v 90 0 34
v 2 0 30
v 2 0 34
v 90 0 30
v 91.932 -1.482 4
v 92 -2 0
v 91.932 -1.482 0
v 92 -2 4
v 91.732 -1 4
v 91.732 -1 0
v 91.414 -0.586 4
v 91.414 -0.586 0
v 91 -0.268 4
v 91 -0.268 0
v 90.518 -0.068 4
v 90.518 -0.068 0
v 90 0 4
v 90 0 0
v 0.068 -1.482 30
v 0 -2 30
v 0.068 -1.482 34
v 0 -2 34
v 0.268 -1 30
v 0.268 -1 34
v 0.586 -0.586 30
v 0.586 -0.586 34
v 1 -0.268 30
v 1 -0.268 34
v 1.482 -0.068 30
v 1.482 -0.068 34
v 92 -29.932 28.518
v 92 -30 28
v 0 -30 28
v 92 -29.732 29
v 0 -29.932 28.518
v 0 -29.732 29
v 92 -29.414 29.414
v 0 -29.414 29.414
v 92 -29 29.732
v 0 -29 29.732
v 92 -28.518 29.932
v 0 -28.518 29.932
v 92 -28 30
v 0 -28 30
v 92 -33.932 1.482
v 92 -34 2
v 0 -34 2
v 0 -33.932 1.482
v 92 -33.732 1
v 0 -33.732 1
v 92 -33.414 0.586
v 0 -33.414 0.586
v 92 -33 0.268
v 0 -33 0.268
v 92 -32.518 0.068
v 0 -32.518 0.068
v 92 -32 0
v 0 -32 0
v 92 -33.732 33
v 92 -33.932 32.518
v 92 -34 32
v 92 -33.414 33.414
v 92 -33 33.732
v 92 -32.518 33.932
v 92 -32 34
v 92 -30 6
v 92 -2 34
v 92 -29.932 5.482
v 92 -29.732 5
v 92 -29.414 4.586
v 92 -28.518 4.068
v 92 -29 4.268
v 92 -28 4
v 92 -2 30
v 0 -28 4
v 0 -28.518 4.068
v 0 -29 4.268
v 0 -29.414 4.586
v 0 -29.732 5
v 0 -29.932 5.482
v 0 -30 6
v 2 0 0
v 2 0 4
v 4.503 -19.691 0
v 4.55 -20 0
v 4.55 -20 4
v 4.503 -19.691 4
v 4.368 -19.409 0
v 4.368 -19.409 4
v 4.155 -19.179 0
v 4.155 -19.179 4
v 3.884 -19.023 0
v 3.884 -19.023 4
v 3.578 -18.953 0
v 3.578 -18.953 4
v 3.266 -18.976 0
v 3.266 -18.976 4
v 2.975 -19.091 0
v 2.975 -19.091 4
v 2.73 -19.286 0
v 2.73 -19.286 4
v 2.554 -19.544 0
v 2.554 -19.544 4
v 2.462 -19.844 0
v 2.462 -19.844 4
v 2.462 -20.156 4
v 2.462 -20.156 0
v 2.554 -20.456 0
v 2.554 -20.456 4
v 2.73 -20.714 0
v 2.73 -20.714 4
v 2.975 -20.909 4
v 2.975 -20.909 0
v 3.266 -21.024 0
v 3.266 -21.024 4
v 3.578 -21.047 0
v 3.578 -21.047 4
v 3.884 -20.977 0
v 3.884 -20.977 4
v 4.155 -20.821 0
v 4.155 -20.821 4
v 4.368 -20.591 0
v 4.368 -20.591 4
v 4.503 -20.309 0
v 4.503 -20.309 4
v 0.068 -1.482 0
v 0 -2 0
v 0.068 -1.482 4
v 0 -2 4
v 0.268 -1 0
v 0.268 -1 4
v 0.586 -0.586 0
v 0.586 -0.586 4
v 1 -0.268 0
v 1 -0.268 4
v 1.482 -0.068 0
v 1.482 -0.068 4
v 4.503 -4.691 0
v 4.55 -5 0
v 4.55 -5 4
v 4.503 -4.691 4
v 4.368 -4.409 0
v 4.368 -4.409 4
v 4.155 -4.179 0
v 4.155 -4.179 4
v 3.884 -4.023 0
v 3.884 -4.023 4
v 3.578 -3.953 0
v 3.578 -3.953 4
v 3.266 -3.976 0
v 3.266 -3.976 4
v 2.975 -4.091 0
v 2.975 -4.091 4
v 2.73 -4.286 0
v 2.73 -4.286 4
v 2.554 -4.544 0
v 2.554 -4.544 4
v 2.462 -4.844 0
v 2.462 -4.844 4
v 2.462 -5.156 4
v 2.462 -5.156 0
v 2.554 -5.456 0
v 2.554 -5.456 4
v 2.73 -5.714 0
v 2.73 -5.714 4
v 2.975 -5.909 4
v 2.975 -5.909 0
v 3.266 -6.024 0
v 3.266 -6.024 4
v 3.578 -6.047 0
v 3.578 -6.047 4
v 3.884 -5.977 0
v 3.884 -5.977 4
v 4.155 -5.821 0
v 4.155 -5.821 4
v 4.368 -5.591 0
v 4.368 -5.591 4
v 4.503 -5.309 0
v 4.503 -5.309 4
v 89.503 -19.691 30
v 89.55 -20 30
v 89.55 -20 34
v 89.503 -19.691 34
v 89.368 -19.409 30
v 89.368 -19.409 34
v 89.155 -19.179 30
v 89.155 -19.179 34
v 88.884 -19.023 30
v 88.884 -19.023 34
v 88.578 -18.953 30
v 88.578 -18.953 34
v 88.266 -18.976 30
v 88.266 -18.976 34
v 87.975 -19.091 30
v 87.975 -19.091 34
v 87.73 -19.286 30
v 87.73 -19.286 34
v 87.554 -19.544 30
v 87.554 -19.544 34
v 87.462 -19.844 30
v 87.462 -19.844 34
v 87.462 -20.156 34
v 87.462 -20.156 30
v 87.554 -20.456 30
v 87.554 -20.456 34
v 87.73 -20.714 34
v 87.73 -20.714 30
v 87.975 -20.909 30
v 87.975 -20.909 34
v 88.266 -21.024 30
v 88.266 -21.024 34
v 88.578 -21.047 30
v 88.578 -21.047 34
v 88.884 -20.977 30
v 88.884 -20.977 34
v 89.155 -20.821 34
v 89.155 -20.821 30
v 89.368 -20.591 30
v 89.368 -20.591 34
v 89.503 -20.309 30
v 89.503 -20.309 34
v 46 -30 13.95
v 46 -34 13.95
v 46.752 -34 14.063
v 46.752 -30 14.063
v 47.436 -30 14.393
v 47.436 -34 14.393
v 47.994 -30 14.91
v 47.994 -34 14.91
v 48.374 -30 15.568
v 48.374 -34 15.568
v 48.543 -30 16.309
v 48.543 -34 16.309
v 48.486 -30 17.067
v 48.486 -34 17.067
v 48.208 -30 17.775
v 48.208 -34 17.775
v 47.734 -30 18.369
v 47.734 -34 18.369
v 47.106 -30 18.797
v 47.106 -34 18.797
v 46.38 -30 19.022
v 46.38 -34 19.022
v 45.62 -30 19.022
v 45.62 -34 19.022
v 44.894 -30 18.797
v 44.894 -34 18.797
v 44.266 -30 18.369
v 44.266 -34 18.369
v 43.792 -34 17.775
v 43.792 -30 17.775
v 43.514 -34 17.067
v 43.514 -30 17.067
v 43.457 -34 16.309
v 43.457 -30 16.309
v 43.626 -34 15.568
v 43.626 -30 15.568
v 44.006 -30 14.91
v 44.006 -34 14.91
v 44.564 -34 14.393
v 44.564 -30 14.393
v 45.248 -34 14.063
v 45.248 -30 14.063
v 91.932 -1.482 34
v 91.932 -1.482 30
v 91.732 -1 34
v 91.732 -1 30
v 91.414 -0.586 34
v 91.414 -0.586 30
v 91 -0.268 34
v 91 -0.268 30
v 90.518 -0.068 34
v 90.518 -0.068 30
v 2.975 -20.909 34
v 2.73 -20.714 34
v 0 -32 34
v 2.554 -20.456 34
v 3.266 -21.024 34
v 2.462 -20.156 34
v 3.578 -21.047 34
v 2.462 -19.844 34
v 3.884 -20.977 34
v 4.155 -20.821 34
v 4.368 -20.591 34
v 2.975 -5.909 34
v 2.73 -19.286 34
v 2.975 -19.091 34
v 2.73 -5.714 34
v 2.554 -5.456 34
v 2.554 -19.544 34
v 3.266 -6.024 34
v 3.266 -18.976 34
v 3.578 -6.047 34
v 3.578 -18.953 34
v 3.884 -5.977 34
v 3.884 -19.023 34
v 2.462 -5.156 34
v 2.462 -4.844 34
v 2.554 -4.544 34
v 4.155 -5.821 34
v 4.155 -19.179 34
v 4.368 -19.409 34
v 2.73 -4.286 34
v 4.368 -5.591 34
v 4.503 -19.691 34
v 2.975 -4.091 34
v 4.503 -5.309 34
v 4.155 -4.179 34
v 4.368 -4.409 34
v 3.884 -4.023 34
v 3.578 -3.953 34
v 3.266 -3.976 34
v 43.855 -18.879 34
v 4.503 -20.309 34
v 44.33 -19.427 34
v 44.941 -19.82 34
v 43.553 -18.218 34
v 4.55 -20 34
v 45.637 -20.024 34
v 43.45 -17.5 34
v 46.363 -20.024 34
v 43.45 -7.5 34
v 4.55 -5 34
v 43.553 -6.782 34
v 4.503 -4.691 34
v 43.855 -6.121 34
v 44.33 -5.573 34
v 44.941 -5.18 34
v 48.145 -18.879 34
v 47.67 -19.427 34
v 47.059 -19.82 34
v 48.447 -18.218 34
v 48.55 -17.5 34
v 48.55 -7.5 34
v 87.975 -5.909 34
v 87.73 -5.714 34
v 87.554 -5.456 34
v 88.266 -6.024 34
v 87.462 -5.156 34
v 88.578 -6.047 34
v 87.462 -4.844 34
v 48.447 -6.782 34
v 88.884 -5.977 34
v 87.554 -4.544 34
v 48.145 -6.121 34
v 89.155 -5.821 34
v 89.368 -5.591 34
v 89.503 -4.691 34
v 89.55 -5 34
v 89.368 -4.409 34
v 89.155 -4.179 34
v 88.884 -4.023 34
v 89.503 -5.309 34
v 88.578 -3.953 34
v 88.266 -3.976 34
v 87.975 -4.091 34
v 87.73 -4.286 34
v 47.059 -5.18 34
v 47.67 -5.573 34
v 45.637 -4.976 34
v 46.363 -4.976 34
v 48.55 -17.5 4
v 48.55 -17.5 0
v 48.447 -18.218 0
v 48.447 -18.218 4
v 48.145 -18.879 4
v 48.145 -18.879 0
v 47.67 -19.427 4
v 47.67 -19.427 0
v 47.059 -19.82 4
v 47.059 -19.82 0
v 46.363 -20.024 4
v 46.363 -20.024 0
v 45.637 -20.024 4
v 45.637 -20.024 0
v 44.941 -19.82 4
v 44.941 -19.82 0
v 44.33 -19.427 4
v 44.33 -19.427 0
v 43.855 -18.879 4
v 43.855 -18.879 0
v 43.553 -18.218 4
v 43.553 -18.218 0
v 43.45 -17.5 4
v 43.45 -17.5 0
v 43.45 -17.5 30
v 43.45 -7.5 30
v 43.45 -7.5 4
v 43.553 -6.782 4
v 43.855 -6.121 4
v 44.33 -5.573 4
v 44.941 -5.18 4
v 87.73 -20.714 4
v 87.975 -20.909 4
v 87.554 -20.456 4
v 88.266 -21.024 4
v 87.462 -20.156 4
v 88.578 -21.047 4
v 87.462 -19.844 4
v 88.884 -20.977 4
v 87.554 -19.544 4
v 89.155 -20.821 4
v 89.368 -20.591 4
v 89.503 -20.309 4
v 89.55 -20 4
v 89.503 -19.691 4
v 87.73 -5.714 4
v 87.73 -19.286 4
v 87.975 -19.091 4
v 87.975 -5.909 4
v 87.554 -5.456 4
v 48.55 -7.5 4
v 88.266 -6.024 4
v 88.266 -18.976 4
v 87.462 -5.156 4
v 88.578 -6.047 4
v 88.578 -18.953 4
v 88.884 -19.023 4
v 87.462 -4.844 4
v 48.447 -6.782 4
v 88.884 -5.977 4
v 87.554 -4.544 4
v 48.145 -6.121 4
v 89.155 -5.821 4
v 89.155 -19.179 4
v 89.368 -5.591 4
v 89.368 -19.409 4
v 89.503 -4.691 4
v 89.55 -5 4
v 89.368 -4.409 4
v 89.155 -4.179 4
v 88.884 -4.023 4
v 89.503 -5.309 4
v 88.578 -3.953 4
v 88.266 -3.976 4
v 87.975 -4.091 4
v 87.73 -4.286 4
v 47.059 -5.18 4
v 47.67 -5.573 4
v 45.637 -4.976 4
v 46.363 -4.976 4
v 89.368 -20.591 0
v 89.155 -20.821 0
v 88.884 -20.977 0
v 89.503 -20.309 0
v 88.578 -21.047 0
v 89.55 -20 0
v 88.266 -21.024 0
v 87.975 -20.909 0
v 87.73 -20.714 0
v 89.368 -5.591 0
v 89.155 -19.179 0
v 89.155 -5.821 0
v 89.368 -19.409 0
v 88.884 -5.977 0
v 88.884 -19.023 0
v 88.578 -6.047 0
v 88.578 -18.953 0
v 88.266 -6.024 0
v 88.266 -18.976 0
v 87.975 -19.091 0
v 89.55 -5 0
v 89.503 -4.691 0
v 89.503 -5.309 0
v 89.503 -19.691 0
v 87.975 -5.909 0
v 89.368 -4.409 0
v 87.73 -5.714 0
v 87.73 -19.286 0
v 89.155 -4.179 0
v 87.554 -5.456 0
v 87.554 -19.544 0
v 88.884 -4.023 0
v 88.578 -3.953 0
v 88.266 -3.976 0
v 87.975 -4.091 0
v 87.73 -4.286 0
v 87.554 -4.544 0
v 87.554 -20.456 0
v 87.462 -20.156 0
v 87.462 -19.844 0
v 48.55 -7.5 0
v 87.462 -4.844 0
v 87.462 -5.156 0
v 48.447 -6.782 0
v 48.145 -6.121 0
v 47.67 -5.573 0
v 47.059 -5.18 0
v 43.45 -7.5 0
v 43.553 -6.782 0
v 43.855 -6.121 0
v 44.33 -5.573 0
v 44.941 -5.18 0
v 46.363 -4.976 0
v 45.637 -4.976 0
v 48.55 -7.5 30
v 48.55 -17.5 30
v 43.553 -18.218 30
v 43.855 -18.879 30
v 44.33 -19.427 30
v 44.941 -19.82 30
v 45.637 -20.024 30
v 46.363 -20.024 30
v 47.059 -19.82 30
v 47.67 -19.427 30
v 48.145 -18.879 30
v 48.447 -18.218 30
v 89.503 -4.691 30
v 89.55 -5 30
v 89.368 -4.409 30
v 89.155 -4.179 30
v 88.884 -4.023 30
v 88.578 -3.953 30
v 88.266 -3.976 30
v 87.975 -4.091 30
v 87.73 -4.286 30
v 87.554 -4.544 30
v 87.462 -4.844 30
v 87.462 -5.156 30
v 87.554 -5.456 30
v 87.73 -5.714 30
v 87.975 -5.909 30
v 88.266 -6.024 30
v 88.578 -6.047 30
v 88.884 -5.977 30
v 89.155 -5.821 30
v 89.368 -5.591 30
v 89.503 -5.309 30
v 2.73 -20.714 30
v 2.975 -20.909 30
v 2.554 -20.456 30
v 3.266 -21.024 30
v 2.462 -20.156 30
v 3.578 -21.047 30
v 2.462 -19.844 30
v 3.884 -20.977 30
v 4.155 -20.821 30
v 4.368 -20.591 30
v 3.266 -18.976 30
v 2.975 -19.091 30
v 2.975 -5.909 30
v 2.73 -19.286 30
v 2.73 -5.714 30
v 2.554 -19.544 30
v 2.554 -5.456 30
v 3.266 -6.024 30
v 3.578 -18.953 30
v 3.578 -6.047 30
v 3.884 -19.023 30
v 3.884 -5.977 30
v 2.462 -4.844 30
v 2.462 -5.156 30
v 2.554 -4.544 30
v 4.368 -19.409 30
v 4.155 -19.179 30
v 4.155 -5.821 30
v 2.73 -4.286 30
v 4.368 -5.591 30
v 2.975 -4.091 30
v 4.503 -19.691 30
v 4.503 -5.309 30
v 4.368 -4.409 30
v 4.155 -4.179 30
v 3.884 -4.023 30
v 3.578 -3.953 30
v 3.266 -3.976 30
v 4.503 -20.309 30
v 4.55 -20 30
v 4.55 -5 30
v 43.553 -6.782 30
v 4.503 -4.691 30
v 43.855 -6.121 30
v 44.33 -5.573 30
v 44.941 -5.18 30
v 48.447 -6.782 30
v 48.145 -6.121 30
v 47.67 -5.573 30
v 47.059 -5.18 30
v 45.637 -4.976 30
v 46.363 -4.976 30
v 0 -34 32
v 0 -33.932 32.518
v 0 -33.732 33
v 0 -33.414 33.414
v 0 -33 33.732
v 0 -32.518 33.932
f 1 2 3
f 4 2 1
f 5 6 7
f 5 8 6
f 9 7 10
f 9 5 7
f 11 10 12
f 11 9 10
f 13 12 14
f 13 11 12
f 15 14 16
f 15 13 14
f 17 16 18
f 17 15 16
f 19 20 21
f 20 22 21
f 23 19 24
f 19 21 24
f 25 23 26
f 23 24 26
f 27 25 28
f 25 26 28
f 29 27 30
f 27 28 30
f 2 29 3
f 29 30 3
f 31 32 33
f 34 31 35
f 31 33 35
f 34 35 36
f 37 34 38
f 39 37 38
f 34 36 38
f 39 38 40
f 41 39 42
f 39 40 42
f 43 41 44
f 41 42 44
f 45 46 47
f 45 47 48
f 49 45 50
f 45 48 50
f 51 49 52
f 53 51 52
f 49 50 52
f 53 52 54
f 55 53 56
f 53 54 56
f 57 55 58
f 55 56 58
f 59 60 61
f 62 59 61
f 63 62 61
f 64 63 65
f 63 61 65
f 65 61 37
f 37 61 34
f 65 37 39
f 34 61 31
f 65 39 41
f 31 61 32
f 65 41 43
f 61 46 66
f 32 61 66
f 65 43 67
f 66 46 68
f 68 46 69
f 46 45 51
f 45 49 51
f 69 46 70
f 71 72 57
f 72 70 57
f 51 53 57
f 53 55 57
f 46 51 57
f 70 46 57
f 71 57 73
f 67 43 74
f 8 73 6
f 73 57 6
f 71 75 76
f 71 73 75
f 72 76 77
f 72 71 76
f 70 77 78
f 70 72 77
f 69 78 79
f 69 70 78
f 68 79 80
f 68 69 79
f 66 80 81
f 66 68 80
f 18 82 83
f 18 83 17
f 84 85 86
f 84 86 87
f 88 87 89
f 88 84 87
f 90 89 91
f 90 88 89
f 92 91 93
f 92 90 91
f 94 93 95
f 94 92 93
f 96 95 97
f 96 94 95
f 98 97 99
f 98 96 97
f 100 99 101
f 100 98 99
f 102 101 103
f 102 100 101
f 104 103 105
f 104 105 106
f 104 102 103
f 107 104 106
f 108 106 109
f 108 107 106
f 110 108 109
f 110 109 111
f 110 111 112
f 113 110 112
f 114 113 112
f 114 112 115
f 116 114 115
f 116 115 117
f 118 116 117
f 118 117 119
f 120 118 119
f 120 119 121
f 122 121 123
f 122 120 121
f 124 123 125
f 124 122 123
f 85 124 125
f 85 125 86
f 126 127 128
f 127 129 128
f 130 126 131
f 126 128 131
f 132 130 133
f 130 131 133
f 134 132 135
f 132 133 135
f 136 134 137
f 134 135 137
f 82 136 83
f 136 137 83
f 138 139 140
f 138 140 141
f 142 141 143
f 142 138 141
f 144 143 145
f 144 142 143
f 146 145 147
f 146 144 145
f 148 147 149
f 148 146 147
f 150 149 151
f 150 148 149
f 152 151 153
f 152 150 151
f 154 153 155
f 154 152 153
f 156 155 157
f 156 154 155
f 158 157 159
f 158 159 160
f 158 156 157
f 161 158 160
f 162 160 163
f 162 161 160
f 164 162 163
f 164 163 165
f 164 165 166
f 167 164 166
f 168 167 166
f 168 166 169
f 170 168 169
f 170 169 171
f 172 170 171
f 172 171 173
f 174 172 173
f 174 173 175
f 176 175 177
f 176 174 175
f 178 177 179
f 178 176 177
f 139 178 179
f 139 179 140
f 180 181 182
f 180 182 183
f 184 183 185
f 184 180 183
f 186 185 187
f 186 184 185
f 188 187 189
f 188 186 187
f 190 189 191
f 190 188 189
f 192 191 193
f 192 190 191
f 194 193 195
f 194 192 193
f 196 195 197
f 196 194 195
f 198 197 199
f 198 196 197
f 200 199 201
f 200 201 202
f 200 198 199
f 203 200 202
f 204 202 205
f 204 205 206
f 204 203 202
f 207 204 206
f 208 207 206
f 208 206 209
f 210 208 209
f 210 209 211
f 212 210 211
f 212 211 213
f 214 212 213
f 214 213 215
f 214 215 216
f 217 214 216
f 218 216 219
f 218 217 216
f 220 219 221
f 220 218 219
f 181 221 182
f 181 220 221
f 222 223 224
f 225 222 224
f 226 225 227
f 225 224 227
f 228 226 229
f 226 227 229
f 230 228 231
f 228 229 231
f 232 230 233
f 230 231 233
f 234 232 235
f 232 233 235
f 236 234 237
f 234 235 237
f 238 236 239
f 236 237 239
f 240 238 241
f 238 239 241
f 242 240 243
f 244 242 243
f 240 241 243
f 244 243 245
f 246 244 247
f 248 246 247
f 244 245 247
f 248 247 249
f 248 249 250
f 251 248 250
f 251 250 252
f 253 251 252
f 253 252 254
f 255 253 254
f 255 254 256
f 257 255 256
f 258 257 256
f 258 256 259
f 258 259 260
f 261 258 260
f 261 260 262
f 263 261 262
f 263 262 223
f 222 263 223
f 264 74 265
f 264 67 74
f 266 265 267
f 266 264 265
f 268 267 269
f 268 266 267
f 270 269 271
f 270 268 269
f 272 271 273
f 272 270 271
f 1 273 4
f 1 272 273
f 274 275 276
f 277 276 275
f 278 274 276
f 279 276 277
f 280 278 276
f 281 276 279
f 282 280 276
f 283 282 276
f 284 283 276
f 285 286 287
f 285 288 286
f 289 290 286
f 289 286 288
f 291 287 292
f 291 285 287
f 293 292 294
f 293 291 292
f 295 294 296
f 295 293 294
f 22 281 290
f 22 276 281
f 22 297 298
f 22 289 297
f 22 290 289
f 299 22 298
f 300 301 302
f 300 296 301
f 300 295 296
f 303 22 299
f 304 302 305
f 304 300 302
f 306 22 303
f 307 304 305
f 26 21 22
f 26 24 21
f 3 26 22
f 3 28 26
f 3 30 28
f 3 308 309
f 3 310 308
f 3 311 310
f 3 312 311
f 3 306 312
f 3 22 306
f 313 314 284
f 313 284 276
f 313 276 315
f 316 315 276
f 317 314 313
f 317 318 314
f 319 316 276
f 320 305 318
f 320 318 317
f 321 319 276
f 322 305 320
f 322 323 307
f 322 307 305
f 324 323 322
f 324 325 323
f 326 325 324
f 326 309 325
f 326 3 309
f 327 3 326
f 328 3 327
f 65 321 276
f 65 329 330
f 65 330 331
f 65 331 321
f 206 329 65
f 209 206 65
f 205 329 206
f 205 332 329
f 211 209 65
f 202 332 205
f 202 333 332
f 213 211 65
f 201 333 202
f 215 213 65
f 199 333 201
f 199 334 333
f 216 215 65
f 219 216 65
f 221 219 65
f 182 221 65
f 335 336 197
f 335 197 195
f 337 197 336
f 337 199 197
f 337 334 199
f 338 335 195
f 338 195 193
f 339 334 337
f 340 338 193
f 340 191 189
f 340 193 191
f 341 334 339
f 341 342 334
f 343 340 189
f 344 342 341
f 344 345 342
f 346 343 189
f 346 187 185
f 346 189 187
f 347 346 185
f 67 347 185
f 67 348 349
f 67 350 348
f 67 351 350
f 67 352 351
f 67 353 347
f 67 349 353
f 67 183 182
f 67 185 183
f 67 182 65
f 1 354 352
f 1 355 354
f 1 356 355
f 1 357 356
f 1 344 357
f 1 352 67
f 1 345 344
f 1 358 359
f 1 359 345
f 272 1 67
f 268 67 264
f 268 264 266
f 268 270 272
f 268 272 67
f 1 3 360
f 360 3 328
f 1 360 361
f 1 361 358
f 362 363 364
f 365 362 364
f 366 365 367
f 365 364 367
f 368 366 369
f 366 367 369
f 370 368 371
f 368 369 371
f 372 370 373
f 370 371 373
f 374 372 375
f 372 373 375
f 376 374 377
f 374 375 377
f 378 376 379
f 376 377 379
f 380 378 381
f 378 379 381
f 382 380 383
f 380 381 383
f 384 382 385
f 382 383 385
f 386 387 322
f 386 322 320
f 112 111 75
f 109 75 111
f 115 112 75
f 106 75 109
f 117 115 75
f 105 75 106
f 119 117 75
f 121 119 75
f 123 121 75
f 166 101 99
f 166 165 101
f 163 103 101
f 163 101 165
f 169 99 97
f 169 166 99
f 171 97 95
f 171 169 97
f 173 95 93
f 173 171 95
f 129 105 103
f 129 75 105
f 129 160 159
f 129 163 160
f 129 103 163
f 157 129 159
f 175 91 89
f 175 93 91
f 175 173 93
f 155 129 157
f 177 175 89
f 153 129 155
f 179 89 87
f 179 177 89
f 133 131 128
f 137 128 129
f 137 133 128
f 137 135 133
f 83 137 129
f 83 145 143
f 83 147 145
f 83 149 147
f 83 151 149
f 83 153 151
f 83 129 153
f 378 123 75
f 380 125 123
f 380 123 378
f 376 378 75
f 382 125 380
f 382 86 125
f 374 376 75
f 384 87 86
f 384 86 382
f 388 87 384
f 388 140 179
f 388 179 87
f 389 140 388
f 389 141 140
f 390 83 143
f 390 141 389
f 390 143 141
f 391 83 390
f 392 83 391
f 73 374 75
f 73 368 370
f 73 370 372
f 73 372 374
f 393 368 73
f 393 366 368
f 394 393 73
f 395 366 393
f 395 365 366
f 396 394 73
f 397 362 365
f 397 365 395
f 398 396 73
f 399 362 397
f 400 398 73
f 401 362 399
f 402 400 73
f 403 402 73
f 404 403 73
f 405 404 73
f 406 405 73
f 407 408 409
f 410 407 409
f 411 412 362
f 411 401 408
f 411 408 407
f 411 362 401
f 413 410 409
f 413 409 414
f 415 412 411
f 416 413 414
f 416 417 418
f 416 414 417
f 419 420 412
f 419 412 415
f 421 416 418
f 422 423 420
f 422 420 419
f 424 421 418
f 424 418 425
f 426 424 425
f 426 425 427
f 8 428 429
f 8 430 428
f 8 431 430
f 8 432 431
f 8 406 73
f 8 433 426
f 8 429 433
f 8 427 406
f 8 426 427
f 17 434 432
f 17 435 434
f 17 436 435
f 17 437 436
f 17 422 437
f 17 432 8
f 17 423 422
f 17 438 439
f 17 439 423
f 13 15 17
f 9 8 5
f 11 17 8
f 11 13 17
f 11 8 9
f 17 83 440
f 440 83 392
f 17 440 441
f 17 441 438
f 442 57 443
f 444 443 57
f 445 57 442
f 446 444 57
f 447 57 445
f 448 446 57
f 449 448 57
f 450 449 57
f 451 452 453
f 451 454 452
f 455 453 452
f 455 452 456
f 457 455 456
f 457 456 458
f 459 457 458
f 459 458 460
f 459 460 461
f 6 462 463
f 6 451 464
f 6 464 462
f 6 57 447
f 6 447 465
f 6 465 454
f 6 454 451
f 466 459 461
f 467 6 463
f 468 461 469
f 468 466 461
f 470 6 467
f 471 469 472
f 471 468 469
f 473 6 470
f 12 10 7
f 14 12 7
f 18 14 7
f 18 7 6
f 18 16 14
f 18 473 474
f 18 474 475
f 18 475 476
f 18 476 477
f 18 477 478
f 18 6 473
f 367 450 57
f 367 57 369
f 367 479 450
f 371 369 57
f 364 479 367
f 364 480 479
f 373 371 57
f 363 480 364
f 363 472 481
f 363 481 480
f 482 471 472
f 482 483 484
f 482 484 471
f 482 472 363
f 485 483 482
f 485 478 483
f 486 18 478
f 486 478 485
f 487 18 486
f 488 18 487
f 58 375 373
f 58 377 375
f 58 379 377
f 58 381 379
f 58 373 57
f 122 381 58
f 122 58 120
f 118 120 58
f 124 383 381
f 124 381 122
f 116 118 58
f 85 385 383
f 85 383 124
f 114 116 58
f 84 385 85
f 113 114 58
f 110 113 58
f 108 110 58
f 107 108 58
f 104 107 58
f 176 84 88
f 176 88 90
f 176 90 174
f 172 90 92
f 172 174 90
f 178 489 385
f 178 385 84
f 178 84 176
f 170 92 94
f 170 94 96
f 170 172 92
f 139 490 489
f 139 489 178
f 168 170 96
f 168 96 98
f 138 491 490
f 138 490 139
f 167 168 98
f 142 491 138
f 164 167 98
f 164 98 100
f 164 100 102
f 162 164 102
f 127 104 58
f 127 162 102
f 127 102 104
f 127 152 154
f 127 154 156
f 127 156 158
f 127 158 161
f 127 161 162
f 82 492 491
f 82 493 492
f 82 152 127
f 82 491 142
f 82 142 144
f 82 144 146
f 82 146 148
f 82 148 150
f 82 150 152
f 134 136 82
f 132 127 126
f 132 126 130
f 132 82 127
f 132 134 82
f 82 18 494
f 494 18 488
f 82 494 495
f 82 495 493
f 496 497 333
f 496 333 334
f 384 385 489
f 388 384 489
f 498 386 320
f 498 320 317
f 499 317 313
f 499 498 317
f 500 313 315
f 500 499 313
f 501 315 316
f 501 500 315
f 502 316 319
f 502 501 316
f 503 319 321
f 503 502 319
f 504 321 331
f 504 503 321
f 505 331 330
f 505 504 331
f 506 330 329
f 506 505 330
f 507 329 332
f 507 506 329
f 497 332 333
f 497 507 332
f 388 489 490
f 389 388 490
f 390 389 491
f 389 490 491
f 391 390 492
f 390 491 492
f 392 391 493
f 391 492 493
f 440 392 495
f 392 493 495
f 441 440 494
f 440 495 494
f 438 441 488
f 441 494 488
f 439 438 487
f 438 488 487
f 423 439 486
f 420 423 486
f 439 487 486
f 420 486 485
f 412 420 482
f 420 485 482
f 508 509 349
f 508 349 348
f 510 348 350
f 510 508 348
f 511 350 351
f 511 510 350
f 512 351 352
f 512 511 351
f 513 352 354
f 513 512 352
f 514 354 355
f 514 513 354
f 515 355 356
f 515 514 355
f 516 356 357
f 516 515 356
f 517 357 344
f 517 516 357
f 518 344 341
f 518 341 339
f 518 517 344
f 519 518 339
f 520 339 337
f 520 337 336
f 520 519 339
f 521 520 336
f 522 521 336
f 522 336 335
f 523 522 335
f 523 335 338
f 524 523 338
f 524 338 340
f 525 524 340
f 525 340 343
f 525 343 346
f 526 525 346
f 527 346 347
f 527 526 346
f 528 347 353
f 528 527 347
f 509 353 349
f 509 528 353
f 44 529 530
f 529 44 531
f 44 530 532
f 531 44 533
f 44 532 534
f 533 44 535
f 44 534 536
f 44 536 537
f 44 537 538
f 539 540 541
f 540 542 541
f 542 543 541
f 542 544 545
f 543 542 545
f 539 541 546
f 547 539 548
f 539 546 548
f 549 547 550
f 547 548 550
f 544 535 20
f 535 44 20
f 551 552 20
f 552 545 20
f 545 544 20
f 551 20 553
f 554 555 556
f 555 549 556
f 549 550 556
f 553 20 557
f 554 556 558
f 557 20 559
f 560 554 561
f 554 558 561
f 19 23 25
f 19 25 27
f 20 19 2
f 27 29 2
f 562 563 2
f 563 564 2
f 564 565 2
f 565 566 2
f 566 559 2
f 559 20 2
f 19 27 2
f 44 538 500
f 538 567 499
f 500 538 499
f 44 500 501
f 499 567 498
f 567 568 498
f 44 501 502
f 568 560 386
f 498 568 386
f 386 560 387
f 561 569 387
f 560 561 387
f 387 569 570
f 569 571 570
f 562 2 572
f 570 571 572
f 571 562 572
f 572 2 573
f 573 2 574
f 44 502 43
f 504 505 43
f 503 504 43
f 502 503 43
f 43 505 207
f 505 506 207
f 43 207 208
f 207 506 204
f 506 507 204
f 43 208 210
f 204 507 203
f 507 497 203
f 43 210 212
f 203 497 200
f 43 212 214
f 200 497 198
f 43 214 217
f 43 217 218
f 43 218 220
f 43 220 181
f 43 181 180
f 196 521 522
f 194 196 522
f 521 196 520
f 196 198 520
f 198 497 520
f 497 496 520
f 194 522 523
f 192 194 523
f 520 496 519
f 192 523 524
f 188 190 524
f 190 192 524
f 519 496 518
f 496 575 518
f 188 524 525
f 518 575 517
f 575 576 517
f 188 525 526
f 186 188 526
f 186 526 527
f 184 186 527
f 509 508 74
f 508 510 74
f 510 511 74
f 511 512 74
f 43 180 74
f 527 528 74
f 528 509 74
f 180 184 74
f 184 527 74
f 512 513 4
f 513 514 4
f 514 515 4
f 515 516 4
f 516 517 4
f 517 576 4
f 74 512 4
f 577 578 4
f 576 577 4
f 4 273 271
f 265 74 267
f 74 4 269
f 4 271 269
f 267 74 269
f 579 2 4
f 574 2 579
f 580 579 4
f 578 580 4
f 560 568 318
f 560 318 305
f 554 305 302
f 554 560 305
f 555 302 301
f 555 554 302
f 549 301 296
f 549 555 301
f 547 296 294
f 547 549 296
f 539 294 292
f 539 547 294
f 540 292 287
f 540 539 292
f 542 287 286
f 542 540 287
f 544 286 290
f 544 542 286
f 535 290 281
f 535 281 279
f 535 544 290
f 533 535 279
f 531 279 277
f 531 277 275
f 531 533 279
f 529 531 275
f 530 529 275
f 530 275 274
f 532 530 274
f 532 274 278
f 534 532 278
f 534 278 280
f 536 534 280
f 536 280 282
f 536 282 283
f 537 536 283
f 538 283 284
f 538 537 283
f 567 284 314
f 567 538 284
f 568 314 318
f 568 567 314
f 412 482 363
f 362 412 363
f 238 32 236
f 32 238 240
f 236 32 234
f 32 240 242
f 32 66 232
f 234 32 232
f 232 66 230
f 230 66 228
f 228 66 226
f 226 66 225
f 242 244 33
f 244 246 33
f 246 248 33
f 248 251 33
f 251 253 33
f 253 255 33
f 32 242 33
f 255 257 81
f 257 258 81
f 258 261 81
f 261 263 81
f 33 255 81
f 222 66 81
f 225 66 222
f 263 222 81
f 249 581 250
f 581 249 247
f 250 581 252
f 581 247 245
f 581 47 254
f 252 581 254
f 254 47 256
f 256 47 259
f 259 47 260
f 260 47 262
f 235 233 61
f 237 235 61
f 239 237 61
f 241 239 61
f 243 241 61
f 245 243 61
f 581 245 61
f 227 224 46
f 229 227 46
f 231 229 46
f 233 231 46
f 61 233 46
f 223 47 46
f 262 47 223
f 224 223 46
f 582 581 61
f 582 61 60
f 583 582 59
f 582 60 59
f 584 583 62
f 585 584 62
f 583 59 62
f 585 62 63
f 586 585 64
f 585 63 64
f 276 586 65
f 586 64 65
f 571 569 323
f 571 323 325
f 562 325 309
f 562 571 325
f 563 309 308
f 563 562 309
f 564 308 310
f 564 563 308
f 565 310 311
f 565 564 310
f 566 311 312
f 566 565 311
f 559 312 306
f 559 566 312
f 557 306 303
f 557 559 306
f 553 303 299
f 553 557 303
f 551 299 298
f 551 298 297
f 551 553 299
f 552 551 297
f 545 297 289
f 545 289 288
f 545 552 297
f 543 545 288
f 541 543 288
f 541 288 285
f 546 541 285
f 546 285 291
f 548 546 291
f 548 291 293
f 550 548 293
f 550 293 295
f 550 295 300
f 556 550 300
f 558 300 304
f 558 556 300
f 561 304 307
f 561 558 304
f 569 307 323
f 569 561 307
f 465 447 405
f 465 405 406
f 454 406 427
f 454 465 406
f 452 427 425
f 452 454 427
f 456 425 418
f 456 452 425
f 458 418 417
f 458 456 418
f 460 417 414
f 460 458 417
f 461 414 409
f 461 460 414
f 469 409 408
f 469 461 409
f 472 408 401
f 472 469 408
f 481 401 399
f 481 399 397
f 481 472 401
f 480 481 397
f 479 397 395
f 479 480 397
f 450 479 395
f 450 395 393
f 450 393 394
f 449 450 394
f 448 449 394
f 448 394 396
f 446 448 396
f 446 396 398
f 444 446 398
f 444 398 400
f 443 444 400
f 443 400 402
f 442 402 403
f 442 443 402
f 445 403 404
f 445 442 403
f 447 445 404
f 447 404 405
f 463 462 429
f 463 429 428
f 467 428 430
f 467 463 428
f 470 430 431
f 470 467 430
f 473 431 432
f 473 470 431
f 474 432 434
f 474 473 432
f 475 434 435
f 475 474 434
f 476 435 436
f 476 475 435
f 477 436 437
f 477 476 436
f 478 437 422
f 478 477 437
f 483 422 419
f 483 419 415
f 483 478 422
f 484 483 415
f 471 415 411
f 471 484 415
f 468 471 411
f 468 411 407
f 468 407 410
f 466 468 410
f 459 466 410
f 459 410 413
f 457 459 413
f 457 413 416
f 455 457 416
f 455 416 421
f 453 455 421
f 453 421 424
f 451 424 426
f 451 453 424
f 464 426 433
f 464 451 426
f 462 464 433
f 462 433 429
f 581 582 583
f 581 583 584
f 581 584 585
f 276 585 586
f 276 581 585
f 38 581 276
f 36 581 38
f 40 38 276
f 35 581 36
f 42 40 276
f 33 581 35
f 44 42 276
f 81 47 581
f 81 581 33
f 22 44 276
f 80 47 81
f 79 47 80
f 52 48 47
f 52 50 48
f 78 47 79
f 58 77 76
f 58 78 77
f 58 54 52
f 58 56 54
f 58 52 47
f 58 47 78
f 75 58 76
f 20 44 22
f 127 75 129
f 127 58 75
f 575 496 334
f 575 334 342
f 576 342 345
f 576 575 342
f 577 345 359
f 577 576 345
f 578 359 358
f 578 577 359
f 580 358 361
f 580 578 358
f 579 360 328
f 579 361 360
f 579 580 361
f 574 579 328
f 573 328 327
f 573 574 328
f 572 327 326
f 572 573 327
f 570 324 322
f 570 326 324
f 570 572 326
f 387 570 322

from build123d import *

# Parameters (mm, degrees)
SKETCH_1_W          = 92
SKETCH_1_H          = 30
SKETCH_1_R          = 1.05
EXTRUDE_1_DEPTH     = 4
SKETCH_4_W          = 92
SKETCH_4_H          = 30
EXTRUDE_4_DEPTH     = 4
SKETCH_5_W          = 92
SKETCH_5_H          = 34
SKETCH_5_R          = 1.05
EXTRUDE_5_DEPTH     = 4
FILLET_4_R          = 2
CUT_EXTRUDE_1_DEPTH = 45
SKETCH_8_R          = 2.55
CUT_EXTRUDE_2_DEPTH = 5


with BuildPart() as part:
    # 草图1 → 凸台-拉伸1 (new body)
    with BuildSketch(Plane.XY):
        with Locations((46, -15)):
            Rectangle(SKETCH_1_W, SKETCH_1_H)
        with Locations((3.5, -5)):
            Circle(SKETCH_1_R, mode=Mode.SUBTRACT)
        with Locations((3.5, -20)):
            Circle(SKETCH_1_R, mode=Mode.SUBTRACT)
        with Locations((88.5, -5)):
            Circle(SKETCH_1_R, mode=Mode.SUBTRACT)
        with Locations((88.5, -20)):
            Circle(SKETCH_1_R, mode=Mode.SUBTRACT)
        with BuildLine():
            Line((43.45, -17.5), (43.45, -7.5))
            ThreePointArc((43.45, -7.5), (46, -4.95), (48.55, -7.5))
            Line((48.55, -7.5), (48.55, -17.5))
            ThreePointArc((48.55, -17.5), (46, -20.05), (43.45, -17.5))
        make_face(mode=Mode.SUBTRACT)
    extrude(amount=EXTRUDE_1_DEPTH)

    # 草图4 → 凸台-拉伸4 (add)
    with BuildSketch(Plane(origin=(0, -30, 0), x_dir=(-1, 0, 0), z_dir=(0, -1, 0))):
        with Locations((-46, -15)):
            Rectangle(SKETCH_4_W, SKETCH_4_H)
    extrude(amount=EXTRUDE_4_DEPTH)

    # 草图5 → 凸台-拉伸5 (add)
    with BuildSketch(Plane.XY.offset(30)):
        with Locations((46, -17)):
            Rectangle(SKETCH_5_W, SKETCH_5_H)
        with Locations((3.5, -5)):
            Circle(SKETCH_5_R, mode=Mode.SUBTRACT)
        with Locations((3.5, -20)):
            Circle(SKETCH_5_R, mode=Mode.SUBTRACT)
        with Locations((88.5, -20)):
            Circle(SKETCH_5_R, mode=Mode.SUBTRACT)
        with Locations((88.5, -5)):
            Circle(SKETCH_5_R, mode=Mode.SUBTRACT)
    extrude(amount=EXTRUDE_5_DEPTH)

    # 圆角4
    fillet_4_edges = [part.edges().sort_by_distance(p)[0] for p in [
        (46, -30, 30),
        (46, -34, 0),
        (46, -34, 34),
        (0, 0, 32),
        (92, 0, 32),
        (0, 0, 2),
        (92, 0, 2),
        (46, -30, 4),
    ]]
    fillet(fillet_4_edges, radius=FILLET_4_R)

    # 草图7 → 切除-拉伸1 (cut)
    with BuildSketch(Plane(origin=(0, 0, 0), x_dir=(-1, 0, 0), z_dir=(0, 0, -1))):
        with BuildLine():
            Line((-48.55, -17.5), (-48.55, -7.5))
            ThreePointArc((-48.55, -7.5), (-46, -4.95), (-43.45, -7.5))
            Line((-43.45, -7.5), (-43.45, -17.5))
            ThreePointArc((-43.45, -17.5), (-46, -20.05), (-48.55, -17.5))
        make_face()
    extrude(amount=-CUT_EXTRUDE_1_DEPTH, mode=Mode.SUBTRACT)

    # 草图8 → 切除-拉伸2 (cut)
    with BuildSketch(Plane(origin=(0, -34, 0), x_dir=(-1, 0, 0), z_dir=(0, -1, 0))):
        with Locations(Location((-46, -16.5, 0), (0, 0, 90))):
            Circle(SKETCH_8_R)
    extrude(amount=-CUT_EXTRUDE_2_DEPTH, mode=Mode.SUBTRACT)


solid = part.part
